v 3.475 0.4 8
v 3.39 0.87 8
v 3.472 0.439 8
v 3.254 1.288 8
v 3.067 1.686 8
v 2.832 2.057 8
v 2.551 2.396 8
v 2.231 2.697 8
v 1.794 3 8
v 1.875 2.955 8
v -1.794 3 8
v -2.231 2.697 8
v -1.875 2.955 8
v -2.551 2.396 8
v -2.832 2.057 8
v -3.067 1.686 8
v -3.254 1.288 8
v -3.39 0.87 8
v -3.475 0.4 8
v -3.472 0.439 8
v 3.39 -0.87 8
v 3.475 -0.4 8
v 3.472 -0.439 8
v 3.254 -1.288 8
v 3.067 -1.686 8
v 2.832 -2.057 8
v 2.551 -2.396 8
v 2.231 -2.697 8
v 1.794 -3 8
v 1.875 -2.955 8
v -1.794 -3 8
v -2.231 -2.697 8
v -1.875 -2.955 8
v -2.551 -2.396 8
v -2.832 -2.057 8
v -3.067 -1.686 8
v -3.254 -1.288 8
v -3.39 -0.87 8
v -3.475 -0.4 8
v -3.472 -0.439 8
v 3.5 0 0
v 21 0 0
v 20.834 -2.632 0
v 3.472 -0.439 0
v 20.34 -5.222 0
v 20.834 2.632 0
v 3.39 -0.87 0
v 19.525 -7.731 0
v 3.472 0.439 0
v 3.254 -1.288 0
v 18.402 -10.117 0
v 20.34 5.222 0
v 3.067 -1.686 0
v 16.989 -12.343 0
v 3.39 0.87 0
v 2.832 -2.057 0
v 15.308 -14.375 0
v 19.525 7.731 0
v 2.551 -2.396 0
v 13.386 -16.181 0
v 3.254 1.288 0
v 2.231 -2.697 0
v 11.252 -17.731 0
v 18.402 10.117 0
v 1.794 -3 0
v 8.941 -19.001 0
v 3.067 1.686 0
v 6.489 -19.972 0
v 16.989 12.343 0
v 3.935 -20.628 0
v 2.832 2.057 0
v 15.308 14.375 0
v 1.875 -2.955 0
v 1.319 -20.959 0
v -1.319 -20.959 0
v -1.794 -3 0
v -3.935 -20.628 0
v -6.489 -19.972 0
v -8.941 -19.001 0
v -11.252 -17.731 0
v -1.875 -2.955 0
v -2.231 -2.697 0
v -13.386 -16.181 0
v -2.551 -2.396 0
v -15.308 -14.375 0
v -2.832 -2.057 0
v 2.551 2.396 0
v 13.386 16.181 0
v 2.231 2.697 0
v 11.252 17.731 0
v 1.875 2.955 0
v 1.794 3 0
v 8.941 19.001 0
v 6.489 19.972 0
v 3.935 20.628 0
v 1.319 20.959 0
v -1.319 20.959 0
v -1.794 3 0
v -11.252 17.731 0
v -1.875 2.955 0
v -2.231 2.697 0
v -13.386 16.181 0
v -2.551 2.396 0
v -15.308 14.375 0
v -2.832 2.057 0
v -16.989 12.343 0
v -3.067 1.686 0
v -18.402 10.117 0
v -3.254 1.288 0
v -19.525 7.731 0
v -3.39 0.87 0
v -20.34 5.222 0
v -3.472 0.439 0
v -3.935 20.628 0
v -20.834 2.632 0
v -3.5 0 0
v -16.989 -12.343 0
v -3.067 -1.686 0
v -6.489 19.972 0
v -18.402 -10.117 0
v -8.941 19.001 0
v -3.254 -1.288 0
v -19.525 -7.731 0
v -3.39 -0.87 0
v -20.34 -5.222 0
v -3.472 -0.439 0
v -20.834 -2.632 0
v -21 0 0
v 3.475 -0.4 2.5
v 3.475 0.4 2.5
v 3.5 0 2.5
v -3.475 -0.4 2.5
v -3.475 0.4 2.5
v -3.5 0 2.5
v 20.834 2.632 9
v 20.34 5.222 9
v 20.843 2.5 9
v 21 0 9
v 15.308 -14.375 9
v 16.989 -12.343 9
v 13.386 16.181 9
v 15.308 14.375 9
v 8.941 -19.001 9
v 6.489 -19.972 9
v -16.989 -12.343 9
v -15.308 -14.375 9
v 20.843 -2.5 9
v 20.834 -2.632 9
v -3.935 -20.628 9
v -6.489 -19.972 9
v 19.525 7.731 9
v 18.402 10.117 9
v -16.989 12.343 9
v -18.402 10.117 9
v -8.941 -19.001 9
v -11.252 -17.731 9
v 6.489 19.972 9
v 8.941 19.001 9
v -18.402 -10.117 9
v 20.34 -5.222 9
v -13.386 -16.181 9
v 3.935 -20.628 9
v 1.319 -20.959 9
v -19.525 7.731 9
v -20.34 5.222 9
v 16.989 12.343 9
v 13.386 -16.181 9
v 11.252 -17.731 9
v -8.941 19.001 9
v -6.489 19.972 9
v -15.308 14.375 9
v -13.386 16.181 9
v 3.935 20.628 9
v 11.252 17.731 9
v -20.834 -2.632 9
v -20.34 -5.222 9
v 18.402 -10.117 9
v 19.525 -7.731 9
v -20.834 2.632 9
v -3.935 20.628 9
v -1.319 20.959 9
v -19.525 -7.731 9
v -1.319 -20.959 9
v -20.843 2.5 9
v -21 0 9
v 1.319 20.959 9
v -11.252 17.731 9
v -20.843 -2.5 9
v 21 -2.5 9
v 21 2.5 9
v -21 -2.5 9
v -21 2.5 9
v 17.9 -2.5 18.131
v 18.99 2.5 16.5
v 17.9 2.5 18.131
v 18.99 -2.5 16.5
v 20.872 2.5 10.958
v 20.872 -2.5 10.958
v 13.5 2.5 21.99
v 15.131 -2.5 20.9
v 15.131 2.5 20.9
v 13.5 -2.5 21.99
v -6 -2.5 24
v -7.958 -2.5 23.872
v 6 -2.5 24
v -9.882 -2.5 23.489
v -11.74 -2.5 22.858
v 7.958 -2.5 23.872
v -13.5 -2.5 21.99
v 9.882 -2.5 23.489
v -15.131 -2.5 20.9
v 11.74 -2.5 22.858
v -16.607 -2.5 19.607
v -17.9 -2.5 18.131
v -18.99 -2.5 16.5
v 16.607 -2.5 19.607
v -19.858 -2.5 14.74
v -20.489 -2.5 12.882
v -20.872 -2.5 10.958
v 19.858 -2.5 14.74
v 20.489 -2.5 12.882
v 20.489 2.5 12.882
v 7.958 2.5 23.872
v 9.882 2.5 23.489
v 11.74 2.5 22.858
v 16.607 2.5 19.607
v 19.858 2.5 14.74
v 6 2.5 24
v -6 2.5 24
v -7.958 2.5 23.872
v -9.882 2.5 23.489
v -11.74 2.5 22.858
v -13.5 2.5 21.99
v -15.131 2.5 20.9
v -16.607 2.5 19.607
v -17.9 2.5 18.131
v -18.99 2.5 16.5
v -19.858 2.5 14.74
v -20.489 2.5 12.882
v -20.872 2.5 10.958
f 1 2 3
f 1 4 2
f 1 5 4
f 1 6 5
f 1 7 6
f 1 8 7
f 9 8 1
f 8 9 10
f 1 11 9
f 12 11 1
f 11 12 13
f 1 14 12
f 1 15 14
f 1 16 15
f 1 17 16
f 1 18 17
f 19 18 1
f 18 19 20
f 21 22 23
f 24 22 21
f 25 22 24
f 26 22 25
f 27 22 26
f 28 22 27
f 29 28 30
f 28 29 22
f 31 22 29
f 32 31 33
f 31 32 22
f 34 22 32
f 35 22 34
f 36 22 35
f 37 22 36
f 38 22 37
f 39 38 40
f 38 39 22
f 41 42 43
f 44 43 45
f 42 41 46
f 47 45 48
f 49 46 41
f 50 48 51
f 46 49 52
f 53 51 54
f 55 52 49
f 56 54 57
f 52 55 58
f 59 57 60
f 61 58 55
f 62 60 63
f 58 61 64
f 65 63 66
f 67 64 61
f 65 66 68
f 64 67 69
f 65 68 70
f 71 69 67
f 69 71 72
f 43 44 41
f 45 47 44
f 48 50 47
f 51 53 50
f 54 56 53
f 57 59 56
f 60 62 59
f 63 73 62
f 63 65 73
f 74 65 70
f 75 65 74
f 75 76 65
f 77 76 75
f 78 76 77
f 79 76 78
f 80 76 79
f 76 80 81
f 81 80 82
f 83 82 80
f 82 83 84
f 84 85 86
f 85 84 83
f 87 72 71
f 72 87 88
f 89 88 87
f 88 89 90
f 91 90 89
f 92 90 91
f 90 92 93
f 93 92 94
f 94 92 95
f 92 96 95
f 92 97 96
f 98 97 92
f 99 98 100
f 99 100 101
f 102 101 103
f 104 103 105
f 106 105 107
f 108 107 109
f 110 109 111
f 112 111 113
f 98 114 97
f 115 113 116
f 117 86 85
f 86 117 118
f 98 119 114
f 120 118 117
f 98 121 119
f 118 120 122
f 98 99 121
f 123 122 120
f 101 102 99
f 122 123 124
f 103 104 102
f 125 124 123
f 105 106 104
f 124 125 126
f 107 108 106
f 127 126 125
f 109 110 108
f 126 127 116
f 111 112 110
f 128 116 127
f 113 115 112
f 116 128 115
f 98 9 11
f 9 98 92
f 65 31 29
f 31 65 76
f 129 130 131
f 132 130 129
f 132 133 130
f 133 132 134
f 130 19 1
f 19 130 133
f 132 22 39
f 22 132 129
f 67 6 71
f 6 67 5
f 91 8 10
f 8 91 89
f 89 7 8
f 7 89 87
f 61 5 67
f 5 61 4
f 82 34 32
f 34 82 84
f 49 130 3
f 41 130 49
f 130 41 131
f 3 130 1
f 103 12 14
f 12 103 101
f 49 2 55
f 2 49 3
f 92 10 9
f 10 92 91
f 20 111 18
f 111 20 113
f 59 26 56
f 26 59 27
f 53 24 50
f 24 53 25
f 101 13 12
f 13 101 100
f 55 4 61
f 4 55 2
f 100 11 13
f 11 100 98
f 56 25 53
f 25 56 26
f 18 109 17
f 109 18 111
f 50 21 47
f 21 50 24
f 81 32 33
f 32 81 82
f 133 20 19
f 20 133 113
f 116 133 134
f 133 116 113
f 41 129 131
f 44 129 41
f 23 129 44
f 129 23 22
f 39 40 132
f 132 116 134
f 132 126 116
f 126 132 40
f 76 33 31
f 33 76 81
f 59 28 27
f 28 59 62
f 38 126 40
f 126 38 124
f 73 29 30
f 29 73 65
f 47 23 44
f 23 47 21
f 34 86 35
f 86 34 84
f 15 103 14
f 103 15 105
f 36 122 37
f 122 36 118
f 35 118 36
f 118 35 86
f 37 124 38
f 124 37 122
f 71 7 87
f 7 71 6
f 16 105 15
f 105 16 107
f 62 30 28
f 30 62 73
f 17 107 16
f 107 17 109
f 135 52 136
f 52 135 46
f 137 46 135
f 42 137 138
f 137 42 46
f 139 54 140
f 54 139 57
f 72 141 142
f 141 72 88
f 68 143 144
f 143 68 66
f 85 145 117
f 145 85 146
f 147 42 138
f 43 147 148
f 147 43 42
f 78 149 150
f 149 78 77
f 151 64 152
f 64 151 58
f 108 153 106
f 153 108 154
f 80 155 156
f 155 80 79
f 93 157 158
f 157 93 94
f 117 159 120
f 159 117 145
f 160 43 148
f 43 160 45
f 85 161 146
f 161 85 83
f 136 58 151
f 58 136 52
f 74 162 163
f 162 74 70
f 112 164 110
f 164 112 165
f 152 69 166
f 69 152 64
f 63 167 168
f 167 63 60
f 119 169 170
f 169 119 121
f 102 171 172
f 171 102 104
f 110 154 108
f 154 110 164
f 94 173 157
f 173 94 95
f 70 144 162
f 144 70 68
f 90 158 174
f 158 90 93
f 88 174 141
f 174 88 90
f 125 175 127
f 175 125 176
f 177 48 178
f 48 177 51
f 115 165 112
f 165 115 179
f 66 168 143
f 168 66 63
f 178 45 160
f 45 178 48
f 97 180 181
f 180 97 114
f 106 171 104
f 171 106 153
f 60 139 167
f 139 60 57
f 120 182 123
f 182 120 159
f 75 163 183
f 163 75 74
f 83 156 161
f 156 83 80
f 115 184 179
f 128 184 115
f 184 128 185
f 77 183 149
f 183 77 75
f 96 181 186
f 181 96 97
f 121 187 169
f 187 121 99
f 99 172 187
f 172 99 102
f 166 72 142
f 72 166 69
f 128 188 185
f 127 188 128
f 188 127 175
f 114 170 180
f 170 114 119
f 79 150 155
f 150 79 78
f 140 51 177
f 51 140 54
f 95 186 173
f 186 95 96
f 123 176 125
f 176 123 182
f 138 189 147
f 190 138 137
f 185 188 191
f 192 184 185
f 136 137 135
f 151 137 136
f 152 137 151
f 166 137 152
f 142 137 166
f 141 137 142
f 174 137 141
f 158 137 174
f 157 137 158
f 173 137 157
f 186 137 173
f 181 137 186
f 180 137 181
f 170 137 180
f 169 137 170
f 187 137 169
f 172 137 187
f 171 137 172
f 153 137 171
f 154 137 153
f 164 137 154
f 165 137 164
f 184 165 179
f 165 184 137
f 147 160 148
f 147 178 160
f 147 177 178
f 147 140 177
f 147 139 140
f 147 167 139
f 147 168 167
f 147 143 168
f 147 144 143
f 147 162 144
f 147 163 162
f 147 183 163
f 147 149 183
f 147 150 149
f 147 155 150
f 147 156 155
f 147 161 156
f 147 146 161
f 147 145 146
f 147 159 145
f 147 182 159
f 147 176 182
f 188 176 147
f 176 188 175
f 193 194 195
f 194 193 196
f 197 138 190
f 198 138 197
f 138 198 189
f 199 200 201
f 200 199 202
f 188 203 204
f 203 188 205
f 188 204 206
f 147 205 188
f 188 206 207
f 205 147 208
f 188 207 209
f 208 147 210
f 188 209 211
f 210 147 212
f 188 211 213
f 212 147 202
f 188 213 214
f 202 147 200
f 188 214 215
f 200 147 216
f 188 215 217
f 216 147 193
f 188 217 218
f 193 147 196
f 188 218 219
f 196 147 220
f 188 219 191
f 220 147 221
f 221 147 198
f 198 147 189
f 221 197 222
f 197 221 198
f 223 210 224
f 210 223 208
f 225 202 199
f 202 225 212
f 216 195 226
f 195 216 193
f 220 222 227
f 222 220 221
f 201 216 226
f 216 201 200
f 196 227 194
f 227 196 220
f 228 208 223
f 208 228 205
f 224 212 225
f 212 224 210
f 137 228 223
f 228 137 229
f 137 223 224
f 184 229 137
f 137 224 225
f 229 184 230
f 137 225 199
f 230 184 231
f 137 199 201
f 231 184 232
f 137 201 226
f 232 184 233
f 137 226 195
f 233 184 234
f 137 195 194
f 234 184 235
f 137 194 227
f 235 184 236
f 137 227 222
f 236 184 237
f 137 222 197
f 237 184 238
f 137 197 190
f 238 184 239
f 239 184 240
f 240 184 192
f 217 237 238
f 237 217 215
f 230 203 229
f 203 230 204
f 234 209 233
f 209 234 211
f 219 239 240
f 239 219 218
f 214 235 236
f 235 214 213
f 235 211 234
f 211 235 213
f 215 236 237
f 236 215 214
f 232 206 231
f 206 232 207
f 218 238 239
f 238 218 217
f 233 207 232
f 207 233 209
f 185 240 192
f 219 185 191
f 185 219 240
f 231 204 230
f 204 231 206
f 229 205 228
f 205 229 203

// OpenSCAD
baseThickness = 9;
baseDiameter = 42;
knobHeight = 8;
knobFlatThickness = 6;
knobDiameter = 7;
knobSlotWidth = 0.8;
knobSlotDepth = 5.5;
handleHeight = 15;
handleWidth = 5;

$fn = 50;
module knobFlattener()
{
    cube([knobDiameter, knobDiameter, knobHeight], center = false);
}

module twistKnob()
{
    difference()
    {
        cylinder(knobHeight, d=knobDiameter, center = false);
        union()
        {
            translate([-knobDiameter/2, knobFlatThickness/2, 0])
                knobFlattener();
            translate([-knobDiameter/2, -knobFlatThickness/2-knobDiameter, 0])
                knobFlattener();
            translate([-knobDiameter/2, -knobSlotWidth/2, knobHeight - knobSlotDepth])
                cube([knobDiameter, knobSlotWidth, knobSlotDepth], center=false);
        }
   }
}

module handleEdge()
{
    rotate_extrude(angle =90, convexity = 10)
        square([handleHeight,handleWidth], center=false);
}


module handle()
{
    translate([baseDiameter/2- handleHeight, handleWidth/2, 0])
        rotate([90,0,0])
            handleEdge();
    translate([-(baseDiameter/2- handleHeight), -handleWidth/2, 0])
        rotate([90,0,180])
            handleEdge();
    translate([-baseDiameter/2 +handleHeight, -handleWidth/2, 0])
        cube([baseDiameter - 2*handleHeight, handleWidth, handleHeight], center = false);
}

difference()
{
    cylinder(baseThickness, d=baseDiameter, center = false);
    twistKnob();
}
translate([0,0,baseThickness])
    handle();

//twistKnob();
